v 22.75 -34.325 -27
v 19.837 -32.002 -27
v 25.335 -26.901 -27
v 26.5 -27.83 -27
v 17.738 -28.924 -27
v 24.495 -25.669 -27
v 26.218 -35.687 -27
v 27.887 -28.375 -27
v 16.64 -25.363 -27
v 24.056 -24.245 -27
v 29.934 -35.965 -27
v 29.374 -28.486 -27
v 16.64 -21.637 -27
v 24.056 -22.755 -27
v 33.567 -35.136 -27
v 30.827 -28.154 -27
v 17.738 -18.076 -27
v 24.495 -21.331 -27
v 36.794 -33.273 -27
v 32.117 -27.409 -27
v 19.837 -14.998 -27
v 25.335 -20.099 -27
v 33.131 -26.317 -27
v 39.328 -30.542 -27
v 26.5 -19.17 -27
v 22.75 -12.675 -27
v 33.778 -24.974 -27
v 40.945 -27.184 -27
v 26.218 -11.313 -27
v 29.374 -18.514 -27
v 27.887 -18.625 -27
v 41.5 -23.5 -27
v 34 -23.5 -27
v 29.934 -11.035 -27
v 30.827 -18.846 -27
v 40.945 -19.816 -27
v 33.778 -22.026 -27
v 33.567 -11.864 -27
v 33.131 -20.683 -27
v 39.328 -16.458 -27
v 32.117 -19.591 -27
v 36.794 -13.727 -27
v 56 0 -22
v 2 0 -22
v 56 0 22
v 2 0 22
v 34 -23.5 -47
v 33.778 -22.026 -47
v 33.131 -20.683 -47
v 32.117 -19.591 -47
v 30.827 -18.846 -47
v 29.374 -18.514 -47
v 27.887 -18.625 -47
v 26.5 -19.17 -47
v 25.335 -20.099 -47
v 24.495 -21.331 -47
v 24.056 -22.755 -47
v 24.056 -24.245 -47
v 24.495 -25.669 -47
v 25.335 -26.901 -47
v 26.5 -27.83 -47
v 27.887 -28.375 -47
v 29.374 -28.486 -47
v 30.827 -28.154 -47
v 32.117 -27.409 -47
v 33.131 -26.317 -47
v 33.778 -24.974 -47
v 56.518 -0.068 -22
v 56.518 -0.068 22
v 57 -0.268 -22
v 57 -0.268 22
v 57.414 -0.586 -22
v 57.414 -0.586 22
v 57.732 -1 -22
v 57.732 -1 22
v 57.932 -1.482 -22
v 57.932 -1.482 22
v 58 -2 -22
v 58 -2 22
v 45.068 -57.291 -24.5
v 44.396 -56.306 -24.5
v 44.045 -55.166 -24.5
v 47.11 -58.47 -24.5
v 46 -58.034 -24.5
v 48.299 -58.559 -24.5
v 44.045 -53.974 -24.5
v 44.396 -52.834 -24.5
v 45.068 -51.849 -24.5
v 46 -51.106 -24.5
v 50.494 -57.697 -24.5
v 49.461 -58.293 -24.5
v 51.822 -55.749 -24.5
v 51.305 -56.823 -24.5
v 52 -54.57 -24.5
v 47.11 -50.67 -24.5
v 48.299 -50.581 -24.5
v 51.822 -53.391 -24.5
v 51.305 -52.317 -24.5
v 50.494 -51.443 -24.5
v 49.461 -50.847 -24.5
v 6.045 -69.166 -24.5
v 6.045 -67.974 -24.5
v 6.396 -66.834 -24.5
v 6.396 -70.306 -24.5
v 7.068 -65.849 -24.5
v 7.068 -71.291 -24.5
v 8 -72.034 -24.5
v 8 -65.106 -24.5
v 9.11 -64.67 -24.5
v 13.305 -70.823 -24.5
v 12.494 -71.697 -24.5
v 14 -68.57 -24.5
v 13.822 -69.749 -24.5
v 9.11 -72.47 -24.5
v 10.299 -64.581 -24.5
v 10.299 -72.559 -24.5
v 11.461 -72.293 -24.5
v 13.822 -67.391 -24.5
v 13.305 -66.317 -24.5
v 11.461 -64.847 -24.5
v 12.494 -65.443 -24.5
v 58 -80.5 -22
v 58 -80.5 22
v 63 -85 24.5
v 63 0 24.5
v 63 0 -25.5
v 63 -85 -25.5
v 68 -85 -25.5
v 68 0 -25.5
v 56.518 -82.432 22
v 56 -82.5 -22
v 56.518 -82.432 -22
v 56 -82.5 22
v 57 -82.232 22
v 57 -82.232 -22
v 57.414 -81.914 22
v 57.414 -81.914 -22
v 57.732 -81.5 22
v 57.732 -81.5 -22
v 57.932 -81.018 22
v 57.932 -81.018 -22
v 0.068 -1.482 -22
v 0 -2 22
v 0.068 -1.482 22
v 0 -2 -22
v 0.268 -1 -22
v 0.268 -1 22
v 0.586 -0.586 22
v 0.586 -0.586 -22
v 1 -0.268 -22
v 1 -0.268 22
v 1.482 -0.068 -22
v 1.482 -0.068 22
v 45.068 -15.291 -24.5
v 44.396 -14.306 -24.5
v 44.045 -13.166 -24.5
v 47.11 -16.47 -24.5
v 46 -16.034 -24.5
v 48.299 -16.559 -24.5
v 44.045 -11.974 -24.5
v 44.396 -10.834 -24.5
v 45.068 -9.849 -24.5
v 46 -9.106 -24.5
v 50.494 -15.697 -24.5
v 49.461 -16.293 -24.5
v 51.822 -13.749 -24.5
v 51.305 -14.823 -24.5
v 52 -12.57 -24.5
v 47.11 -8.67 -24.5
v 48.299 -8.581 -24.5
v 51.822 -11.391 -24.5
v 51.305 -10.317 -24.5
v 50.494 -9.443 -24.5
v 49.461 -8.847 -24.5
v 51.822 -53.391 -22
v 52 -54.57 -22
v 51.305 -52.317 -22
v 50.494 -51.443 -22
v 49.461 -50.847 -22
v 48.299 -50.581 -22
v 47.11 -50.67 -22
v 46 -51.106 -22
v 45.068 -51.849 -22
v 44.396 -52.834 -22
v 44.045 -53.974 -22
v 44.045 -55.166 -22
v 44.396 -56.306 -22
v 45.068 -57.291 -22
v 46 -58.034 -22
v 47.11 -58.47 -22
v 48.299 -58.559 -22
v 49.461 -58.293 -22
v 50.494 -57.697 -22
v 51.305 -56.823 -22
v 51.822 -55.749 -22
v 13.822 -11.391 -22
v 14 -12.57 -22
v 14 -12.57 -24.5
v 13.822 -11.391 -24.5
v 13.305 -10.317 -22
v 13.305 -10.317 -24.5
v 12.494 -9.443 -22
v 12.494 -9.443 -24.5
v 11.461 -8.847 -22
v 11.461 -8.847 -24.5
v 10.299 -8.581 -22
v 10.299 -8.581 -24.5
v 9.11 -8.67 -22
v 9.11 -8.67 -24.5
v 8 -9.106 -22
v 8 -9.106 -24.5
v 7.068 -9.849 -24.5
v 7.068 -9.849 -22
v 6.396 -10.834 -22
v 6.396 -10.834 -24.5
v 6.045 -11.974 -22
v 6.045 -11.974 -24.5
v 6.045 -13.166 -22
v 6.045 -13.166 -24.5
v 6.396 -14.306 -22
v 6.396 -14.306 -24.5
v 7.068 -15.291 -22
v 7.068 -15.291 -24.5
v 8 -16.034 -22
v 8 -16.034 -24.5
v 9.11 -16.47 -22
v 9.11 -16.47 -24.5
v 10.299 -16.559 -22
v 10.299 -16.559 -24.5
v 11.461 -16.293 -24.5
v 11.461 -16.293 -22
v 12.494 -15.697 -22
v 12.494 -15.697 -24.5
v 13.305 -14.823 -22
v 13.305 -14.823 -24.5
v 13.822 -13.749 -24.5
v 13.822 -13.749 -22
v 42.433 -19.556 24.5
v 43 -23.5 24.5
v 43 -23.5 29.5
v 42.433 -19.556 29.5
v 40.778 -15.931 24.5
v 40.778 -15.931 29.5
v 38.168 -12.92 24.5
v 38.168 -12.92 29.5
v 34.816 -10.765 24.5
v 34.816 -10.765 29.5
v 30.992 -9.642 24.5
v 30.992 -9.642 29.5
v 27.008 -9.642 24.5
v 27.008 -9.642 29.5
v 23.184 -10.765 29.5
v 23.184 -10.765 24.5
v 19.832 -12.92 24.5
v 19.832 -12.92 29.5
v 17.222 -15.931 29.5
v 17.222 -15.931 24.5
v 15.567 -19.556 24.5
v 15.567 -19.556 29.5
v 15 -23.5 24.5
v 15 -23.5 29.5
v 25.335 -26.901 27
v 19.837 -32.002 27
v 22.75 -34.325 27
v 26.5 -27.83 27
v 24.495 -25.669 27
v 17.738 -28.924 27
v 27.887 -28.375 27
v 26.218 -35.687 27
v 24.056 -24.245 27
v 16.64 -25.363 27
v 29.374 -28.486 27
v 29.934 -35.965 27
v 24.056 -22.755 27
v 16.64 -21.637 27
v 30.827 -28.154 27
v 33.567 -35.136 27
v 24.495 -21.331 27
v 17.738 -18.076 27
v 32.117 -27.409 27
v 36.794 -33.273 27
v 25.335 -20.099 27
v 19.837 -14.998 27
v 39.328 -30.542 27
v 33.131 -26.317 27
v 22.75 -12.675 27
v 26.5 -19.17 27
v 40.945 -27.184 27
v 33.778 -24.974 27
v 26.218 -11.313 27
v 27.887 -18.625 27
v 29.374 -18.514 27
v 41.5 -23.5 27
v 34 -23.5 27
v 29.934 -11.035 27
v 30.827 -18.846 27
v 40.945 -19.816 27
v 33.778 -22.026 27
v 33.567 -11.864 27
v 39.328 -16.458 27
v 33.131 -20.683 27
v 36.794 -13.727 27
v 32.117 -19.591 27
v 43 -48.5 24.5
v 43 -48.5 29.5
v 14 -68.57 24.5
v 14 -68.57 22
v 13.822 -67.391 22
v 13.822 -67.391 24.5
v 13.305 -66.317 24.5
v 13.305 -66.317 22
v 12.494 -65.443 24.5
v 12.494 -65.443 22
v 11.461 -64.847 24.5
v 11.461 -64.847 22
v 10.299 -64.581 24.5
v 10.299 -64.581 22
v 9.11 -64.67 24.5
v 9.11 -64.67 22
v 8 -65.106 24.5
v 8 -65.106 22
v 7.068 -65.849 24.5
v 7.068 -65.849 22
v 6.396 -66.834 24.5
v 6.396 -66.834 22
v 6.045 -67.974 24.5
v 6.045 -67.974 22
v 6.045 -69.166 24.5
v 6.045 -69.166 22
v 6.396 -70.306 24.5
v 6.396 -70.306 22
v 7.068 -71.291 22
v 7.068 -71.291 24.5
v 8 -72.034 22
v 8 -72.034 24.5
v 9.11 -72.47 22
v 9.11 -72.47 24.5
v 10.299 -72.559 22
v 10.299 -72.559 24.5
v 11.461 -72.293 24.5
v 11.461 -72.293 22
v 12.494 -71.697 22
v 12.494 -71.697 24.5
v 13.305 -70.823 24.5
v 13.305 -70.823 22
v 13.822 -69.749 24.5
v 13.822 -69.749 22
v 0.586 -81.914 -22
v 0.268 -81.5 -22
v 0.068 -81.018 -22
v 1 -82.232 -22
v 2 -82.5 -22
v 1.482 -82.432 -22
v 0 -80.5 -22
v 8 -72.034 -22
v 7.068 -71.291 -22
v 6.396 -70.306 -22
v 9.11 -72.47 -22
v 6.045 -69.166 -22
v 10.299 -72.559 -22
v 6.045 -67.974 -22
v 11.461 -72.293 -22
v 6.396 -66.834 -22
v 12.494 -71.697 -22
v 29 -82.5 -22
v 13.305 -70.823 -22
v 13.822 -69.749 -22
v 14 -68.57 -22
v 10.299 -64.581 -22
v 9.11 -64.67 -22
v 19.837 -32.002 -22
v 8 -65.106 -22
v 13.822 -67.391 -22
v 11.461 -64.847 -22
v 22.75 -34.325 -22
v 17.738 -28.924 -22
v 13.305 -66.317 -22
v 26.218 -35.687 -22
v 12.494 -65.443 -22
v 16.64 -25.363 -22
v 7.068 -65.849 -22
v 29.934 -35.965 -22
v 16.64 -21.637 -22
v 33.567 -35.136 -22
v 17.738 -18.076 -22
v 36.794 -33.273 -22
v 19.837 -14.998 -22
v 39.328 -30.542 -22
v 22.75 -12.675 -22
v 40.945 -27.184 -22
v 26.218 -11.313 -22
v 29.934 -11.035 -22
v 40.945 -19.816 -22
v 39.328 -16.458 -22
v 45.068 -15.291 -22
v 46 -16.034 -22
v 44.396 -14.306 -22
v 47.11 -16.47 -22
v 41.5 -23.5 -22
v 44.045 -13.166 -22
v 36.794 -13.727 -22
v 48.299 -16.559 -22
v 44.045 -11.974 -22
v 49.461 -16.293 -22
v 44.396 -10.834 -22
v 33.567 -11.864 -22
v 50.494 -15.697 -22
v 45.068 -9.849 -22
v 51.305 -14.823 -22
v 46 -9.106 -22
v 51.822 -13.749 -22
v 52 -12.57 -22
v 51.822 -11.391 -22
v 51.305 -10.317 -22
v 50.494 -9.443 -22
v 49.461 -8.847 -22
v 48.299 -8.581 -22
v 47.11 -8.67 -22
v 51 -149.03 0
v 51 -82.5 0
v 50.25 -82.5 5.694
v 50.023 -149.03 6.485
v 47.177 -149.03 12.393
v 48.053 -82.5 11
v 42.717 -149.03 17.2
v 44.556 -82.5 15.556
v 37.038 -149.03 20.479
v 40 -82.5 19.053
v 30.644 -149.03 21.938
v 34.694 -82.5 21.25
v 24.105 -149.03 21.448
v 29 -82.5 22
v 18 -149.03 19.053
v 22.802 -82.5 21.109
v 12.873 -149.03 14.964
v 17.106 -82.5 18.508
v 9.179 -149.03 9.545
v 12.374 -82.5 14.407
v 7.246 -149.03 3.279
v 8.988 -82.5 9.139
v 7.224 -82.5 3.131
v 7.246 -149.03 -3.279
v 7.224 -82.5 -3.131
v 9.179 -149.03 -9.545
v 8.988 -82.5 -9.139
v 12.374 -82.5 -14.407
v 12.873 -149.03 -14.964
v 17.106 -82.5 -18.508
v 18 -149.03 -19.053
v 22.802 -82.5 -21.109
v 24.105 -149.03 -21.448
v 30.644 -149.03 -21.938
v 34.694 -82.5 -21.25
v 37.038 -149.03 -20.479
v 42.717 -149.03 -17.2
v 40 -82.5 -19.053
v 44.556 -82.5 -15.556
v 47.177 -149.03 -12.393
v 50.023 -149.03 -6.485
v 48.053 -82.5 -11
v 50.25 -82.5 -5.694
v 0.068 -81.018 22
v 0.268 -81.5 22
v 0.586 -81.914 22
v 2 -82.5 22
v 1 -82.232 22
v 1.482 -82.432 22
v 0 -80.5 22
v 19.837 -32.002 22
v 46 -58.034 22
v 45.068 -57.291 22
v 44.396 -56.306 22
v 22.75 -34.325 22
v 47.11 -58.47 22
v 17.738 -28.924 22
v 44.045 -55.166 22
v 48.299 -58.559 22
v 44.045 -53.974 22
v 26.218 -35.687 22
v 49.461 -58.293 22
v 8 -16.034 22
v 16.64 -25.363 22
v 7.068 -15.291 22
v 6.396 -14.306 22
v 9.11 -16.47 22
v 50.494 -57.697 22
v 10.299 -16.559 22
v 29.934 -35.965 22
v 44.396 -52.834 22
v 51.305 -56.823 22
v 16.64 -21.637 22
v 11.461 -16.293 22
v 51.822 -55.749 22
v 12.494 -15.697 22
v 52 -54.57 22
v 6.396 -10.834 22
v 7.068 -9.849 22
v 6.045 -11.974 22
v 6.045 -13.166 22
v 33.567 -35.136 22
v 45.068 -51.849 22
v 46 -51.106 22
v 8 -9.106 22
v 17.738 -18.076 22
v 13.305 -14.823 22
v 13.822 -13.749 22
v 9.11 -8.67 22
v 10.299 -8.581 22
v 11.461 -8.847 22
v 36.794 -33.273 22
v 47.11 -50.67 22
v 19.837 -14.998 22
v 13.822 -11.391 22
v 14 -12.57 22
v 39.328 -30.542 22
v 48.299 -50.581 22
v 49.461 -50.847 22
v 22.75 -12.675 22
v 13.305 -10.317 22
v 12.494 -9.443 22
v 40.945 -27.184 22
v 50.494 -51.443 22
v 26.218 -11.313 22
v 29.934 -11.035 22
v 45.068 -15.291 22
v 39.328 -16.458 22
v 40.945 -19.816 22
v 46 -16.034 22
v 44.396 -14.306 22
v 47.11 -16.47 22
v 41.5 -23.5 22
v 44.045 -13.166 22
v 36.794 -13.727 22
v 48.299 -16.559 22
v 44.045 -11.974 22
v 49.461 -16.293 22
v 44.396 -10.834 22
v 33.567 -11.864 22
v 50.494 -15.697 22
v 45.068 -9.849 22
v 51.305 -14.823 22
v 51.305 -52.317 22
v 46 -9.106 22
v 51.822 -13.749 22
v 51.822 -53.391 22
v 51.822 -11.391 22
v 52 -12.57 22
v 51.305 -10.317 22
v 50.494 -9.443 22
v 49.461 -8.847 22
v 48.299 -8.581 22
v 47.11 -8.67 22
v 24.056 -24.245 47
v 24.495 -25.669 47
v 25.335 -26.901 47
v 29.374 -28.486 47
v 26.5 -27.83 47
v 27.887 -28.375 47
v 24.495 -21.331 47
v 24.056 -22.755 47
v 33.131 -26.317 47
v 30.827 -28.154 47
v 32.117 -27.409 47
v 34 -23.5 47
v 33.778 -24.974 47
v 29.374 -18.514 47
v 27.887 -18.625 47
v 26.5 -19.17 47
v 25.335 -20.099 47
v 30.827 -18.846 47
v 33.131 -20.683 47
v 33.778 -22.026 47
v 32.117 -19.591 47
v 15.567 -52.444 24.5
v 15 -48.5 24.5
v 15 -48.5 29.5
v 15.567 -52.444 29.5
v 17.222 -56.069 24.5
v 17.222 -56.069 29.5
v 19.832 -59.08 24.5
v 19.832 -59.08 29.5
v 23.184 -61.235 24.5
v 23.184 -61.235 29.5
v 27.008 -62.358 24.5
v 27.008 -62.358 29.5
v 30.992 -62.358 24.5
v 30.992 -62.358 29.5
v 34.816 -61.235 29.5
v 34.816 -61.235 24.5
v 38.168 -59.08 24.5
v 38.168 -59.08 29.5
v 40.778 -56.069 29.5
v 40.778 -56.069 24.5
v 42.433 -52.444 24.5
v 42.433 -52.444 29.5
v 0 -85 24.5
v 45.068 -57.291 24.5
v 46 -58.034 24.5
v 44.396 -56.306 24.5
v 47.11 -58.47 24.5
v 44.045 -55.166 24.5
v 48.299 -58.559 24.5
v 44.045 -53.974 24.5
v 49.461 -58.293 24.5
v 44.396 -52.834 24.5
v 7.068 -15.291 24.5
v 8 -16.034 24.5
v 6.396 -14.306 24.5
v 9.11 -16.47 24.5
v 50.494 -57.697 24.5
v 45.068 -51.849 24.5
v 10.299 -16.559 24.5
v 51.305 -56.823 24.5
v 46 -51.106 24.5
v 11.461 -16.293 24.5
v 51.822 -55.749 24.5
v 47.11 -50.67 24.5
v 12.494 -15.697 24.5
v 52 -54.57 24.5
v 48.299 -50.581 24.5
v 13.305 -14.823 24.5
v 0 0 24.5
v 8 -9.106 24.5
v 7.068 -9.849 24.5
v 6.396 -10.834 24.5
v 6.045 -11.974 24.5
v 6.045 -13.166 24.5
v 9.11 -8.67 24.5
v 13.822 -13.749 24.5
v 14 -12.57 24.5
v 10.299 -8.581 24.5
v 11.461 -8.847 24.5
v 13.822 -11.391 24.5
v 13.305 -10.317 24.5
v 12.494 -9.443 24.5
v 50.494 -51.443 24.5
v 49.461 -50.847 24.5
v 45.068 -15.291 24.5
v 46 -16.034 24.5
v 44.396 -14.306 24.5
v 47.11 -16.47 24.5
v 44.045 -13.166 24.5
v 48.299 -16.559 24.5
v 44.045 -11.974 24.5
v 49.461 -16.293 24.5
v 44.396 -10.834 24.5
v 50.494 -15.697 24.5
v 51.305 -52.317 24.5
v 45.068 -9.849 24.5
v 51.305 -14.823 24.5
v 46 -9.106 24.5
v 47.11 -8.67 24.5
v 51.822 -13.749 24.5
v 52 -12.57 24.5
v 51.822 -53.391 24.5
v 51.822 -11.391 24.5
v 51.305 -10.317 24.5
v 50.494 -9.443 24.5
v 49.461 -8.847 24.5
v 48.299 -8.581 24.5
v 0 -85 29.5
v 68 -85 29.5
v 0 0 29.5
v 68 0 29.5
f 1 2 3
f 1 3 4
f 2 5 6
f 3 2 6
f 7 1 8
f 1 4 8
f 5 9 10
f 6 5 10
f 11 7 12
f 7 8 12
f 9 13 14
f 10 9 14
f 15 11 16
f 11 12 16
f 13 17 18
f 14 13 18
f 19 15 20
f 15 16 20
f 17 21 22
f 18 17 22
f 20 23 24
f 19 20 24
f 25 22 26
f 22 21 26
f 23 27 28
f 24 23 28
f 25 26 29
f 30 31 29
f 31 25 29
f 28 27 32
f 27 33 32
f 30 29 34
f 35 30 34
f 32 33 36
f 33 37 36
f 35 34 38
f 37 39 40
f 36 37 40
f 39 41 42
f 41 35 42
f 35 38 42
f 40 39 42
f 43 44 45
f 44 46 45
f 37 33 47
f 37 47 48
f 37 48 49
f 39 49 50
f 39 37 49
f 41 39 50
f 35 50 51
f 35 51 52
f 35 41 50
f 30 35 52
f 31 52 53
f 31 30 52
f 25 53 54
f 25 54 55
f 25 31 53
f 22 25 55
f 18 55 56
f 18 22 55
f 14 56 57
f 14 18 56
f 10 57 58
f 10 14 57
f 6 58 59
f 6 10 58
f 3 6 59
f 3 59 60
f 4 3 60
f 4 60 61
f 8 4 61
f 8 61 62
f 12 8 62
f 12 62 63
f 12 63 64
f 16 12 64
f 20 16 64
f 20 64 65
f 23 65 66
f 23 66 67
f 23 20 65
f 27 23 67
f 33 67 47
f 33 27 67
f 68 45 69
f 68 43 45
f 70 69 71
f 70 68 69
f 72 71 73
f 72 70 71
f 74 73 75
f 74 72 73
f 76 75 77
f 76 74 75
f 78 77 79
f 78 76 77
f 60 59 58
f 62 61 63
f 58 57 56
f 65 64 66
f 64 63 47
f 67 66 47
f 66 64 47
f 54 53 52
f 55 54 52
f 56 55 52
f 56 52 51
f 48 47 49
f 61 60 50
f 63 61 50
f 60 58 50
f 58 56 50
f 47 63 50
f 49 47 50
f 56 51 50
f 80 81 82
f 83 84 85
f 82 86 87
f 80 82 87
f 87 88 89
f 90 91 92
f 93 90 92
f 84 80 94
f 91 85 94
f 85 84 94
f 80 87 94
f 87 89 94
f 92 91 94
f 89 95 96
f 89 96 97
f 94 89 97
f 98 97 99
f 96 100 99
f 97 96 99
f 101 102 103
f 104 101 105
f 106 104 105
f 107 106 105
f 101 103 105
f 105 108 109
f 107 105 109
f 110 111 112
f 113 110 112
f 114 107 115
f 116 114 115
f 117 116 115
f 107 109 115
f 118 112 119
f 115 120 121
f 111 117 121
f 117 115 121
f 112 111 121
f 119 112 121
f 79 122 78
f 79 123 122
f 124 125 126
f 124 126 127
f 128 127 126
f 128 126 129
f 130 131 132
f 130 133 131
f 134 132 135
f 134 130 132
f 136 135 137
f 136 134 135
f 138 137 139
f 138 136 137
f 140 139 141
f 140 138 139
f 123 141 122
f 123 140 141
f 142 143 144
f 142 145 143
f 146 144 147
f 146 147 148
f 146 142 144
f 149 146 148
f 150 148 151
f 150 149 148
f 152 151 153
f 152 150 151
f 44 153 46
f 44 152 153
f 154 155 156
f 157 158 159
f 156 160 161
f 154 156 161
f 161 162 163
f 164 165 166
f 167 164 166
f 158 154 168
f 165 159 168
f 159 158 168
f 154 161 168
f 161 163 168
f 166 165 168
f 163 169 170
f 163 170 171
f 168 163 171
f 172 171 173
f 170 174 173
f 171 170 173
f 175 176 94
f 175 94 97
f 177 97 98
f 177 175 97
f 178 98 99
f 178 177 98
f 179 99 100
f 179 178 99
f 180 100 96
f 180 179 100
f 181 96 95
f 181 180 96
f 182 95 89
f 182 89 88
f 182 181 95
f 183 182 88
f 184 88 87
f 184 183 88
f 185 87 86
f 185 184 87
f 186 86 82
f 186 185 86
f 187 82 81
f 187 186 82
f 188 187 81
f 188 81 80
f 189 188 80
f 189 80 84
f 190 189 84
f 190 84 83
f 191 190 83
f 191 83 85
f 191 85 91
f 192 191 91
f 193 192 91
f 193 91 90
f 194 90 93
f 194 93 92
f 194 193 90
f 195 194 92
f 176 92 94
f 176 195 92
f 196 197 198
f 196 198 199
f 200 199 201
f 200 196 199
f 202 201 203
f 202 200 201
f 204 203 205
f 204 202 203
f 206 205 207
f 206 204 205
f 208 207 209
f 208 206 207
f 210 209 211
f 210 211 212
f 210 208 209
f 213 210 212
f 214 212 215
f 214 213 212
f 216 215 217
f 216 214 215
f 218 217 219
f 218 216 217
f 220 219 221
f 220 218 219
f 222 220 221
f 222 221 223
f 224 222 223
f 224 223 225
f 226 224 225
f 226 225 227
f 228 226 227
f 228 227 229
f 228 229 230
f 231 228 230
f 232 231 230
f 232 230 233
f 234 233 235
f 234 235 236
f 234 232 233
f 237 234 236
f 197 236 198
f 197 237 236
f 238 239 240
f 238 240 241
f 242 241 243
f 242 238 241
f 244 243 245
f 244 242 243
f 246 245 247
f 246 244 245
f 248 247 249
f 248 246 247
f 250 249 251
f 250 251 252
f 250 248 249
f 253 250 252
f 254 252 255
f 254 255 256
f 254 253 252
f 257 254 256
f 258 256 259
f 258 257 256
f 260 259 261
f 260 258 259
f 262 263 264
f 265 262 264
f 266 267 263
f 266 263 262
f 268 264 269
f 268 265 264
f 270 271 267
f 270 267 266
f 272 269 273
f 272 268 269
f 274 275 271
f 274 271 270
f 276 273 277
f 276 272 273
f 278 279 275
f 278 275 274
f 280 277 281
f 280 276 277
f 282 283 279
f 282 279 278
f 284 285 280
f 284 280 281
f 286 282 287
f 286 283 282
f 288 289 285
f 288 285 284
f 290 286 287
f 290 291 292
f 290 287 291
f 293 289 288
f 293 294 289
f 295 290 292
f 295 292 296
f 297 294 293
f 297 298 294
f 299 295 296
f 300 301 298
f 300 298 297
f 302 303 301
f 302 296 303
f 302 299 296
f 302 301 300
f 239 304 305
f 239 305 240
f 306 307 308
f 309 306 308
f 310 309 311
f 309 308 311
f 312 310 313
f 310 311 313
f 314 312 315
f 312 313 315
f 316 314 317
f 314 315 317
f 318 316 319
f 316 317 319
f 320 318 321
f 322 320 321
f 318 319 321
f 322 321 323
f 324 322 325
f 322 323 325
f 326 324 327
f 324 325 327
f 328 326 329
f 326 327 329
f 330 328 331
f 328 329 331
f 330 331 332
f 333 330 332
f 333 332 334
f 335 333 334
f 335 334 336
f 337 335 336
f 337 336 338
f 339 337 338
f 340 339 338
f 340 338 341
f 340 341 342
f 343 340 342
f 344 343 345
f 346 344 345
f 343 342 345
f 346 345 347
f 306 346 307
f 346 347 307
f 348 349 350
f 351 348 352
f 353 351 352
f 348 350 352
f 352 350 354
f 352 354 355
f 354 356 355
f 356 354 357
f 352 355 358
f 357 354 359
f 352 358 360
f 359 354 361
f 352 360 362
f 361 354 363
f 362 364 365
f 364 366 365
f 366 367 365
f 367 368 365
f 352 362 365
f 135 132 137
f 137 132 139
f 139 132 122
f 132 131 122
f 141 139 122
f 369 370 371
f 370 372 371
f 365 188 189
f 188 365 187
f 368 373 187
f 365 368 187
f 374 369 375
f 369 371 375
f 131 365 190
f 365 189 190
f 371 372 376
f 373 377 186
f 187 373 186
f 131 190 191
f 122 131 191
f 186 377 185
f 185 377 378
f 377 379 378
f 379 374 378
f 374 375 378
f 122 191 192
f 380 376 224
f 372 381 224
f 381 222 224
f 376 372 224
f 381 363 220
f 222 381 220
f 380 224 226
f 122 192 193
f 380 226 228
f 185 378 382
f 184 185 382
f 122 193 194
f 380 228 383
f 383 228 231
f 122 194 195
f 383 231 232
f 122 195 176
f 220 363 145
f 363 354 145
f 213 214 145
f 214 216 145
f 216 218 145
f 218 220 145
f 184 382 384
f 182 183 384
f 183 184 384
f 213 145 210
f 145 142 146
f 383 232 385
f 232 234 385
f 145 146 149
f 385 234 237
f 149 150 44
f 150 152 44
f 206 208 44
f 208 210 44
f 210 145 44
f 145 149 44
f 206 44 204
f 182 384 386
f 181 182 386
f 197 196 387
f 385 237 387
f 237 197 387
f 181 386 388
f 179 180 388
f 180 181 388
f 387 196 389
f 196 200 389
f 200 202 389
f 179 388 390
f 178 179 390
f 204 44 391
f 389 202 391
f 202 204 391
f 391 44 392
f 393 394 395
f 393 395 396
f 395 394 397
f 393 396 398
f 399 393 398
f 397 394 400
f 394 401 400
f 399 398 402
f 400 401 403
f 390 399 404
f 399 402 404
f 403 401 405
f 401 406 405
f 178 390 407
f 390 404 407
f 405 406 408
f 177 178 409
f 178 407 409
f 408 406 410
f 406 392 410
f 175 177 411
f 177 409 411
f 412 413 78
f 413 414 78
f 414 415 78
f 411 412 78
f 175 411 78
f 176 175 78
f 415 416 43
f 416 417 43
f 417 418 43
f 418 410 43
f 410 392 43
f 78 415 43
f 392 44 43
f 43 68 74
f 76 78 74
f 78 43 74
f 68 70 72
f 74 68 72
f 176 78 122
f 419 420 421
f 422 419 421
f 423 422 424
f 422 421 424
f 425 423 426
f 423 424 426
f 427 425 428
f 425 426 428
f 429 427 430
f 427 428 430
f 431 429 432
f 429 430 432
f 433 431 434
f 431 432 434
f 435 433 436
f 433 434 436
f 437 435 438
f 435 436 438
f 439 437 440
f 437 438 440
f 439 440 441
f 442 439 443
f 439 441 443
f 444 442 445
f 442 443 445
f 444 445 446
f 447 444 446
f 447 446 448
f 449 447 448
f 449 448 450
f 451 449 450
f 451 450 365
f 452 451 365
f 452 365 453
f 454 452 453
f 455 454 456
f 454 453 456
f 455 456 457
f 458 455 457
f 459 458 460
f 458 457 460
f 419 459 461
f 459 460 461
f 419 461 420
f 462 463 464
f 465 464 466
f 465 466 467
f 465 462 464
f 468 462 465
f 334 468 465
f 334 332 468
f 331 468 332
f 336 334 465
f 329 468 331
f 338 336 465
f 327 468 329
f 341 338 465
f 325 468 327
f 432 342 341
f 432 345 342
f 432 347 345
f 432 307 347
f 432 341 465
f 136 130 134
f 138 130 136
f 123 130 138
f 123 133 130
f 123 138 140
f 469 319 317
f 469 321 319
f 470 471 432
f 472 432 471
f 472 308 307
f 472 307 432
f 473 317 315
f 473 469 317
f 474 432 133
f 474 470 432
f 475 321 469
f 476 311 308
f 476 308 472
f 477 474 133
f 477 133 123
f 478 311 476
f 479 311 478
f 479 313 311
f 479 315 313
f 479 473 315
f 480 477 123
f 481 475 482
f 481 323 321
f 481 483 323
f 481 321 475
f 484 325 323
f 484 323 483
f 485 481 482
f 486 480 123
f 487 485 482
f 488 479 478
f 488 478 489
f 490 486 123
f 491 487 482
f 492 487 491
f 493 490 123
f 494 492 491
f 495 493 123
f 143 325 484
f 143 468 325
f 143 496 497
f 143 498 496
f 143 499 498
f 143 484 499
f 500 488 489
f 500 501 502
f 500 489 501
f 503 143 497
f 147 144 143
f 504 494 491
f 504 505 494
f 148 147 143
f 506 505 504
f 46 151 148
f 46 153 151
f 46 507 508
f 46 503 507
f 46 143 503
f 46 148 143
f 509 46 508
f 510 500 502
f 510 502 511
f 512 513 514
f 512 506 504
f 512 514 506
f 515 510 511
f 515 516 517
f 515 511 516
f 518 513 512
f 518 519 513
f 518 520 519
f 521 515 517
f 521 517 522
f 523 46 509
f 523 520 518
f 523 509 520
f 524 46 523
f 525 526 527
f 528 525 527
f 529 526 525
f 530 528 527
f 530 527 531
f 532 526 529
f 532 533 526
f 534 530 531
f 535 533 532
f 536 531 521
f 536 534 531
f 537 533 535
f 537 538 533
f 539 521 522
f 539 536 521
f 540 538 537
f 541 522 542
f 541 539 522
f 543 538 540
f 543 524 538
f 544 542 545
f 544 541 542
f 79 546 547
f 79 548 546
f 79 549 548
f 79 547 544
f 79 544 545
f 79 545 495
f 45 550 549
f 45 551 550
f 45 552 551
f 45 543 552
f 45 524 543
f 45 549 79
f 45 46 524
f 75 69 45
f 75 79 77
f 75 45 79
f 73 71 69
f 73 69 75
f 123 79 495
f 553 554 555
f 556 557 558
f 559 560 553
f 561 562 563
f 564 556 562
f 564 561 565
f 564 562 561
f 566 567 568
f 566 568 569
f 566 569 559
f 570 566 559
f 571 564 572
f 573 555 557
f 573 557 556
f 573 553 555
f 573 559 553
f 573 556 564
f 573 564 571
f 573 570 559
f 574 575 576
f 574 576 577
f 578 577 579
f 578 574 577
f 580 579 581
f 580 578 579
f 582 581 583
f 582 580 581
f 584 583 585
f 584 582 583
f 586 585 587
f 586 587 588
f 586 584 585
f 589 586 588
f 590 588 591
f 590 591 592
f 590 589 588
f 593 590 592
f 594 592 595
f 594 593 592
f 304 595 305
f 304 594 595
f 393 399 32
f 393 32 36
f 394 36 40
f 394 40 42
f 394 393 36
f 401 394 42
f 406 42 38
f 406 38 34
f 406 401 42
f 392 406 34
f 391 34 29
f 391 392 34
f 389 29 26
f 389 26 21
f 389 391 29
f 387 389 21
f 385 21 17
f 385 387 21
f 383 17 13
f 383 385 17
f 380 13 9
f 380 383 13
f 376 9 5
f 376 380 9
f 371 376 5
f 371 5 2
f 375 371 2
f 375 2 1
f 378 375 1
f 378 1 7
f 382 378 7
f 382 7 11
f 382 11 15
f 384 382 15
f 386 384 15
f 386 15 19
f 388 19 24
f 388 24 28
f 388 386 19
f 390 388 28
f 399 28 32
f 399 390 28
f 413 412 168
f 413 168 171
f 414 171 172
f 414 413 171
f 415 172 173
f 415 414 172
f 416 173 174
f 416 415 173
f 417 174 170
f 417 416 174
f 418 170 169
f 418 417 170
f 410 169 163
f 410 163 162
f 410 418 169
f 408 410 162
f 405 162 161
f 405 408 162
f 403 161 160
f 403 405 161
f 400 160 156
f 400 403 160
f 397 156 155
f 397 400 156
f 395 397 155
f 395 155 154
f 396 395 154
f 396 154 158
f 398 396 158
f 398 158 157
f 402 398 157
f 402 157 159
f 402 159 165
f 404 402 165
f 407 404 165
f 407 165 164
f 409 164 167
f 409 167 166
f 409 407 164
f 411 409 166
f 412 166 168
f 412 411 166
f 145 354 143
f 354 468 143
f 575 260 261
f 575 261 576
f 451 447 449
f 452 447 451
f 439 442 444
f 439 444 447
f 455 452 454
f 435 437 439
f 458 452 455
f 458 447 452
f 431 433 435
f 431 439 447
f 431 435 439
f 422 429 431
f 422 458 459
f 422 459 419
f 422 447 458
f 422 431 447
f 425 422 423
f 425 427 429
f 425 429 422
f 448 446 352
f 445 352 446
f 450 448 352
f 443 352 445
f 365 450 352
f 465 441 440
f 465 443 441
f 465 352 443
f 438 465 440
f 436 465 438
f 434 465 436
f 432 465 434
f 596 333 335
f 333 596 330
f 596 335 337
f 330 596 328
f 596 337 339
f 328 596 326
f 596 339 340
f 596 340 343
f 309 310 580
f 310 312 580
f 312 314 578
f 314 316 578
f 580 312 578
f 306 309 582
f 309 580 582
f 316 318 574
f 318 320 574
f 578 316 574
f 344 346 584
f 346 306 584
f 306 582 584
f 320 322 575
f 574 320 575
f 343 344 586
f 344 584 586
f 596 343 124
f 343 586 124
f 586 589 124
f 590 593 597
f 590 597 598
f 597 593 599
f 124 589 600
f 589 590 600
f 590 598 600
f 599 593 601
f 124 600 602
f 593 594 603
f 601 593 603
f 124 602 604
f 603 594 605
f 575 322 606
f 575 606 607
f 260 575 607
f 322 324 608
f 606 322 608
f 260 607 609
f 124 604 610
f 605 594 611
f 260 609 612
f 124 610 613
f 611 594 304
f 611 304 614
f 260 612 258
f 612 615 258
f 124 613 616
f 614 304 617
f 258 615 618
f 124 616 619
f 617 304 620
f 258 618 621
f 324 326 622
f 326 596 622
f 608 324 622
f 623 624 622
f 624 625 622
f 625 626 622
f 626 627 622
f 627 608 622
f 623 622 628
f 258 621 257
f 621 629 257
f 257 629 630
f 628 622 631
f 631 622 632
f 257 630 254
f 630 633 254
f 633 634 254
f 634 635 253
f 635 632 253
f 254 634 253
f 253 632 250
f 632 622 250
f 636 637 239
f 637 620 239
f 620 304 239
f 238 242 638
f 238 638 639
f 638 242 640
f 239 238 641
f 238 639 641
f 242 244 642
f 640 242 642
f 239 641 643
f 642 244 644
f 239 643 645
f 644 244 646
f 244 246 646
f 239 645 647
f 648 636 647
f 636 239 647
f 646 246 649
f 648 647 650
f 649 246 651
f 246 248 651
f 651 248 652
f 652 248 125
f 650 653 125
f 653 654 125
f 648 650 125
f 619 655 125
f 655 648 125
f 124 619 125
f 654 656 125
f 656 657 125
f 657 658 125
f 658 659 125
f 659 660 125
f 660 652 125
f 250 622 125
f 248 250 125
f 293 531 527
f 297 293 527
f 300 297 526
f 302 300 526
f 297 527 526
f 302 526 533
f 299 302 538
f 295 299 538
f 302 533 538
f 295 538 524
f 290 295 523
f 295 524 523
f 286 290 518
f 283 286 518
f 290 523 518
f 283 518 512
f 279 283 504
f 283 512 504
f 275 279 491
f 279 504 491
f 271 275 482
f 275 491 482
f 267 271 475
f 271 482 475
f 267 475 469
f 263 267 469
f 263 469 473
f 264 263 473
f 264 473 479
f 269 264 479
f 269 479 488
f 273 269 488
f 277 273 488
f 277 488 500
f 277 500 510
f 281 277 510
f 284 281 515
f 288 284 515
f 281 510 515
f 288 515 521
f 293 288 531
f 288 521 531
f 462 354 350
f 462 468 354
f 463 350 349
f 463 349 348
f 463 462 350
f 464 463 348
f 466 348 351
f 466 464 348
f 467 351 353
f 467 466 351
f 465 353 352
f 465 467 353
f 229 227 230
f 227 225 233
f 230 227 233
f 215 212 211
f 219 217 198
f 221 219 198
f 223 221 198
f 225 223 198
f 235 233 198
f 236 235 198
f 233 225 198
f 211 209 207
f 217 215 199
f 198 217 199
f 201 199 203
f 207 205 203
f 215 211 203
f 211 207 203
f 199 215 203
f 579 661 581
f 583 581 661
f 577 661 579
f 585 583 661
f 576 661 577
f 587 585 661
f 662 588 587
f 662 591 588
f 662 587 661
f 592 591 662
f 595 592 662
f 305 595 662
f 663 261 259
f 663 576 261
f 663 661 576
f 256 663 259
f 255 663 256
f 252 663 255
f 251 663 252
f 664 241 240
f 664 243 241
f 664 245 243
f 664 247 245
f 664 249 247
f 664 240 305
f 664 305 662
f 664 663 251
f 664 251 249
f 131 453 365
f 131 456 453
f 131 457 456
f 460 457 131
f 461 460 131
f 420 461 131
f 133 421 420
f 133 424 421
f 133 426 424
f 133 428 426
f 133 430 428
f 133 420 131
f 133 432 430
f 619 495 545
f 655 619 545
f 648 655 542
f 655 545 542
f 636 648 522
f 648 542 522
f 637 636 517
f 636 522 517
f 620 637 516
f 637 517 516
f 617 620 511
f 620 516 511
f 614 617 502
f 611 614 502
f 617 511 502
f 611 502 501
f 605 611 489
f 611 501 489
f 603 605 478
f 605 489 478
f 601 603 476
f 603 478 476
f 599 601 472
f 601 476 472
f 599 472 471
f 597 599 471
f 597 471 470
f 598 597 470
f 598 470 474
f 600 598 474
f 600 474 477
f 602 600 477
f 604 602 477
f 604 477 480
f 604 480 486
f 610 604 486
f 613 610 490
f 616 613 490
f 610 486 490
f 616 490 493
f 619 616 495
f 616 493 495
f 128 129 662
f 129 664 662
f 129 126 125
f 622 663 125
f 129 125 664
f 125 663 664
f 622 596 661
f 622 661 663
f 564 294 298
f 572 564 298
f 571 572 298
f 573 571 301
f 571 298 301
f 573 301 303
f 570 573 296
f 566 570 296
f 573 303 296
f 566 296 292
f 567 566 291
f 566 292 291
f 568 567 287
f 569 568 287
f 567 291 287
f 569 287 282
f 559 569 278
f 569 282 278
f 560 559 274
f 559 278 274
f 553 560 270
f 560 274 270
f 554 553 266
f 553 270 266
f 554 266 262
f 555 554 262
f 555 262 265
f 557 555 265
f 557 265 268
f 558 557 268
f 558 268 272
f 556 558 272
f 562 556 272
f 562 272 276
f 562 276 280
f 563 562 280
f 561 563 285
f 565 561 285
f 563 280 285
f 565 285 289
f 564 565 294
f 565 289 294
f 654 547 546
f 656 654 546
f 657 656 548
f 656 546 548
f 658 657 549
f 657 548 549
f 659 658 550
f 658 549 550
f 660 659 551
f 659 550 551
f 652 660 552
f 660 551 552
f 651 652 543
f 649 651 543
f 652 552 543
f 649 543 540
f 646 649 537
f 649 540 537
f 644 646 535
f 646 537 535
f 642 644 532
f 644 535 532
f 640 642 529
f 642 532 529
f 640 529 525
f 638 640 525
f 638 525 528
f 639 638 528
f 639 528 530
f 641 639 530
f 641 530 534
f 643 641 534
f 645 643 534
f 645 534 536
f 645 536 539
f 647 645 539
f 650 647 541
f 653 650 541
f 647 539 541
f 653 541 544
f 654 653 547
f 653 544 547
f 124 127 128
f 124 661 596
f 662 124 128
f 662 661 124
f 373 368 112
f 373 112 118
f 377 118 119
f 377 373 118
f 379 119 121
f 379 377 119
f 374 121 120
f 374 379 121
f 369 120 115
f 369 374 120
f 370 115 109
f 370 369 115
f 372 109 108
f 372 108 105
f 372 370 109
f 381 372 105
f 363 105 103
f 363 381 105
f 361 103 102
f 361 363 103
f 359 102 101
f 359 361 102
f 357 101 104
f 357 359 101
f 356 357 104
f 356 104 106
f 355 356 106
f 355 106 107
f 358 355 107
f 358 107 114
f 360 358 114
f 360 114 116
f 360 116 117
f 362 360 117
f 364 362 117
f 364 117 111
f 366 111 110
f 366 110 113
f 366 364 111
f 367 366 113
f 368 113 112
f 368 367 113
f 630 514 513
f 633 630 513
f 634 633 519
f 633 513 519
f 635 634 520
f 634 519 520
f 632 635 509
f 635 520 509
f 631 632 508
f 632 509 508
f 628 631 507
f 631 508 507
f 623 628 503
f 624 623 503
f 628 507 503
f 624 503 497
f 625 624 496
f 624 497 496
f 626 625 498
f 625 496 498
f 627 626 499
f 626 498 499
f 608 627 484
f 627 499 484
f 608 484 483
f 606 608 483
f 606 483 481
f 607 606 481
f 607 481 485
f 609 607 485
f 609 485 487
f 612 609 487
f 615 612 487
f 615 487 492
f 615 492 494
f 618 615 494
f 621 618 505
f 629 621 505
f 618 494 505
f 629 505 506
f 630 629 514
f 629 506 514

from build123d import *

# Parameters (mm, degrees)
SKETCH_W       = 58
SKETCH_H       = 82.5
PAD_DEPTH      = 22
PAD_DEPTH_BACK = 22
SKETCH001_R    = 12.5
PAD001_DEPTH   = 5
SKETCH002_R    = 5
PAD002_DEPTH   = 20
SKETCH003_R    = 4
PAD003_DEPTH   = 2.5
FILLET_R       = 2
SKETCH004_R    = 22
PAD004_DEPTH   = 66.53
SKETCH005_W    = 68
SKETCH005_H    = 85
PAD005_DEPTH   = 5
SKETCH006_W    = 5
SKETCH006_H    = 85
PAD006_DEPTH   = 50


with BuildPart() as part:
    # Sketch → Pad (new body, two sides)
    with BuildSketch(Plane.XY) as pad_sk:
        with Locations((29, -41.25)):
            Rectangle(SKETCH_W, SKETCH_H)
    extrude(amount=PAD_DEPTH)
    extrude(pad_sk.sketch, amount=-PAD_DEPTH_BACK)

    # Sketch001 (on Face6 of Pad) → Pad001 (join)
    with BuildSketch(Plane.XY.offset(22)):
        with Locations((29, -23.5)):
            Circle(SKETCH001_R)
    pad001 = extrude(amount=PAD001_DEPTH)

    # Mirrored: Pad001 across XY
    add(pad001.mirror(Plane.XY))

    # Sketch002 (on Face10 of Mirrored) → Pad002 (join)
    with BuildSketch(Plane.XY.offset(27)):
        with Locations((29, -23.5)):
            Circle(SKETCH002_R)
    pad002 = extrude(amount=PAD002_DEPTH)

    # Mirrored001: Pad002 across XY
    add(pad002.mirror(Plane.XY))

    # Sketch003 (on Face5 of Mirrored001) → Pad003 (join)
    with BuildSketch(Plane.XY.offset(22)):
        with Locations((10, -12.57)):
            Circle(SKETCH003_R)
        with Locations((48, -12.57)):
            Circle(SKETCH003_R)
        with Locations((10, -68.57)):
            Circle(SKETCH003_R)
        with Locations((48, -54.57)):
            Circle(SKETCH003_R)
    pad003 = extrude(amount=PAD003_DEPTH)

    # Mirrored002: Pad003 across XY
    add(pad003.mirror(Plane.XY))

    # Fillet
    fillet_edges = [part.edges().sort_by_distance(p)[0] for p in [
        (58, 0, 0),
        (0, 0, 0),
        (58, -82.5, 0),
        (0, -82.5, 0),
    ]]
    fillet(fillet_edges, radius=FILLET_R)

    # Sketch004 (on Face10 of Fillet) → Pad004 (join)
    with BuildSketch(Plane.XZ.offset(82.5)):
        with Locations((29, 0)):
            Circle(SKETCH004_R)
    extrude(amount=PAD004_DEPTH)

    # Sketch005 (on Face32 of Pad004) → Pad005 (join)
    with BuildSketch(Plane.XY.offset(24.5)):
        with Locations((34, -42.5)):
            Rectangle(SKETCH005_W, SKETCH005_H)
        with BuildLine():
            ThreePointArc((43, -23.5), (29, -9.5), (15, -23.5))
            Line((15, -23.5), (15, -48.5))
            ThreePointArc((15, -48.5), (29, -62.5), (43, -48.5))
            Line((43, -48.5), (43, -23.5))
        make_face(mode=Mode.SUBTRACT)
    extrude(amount=PAD005_DEPTH)

    # Sketch006 (on Face4 of Pad005) → Pad006 (join)
    with BuildSketch(Plane(origin=(0, 0, 24.5), x_dir=(1, 0, 0), z_dir=(0, 0, -1))):
        with Locations((65.5, 42.5)):
            Rectangle(SKETCH006_W, SKETCH006_H)
    extrude(amount=PAD006_DEPTH)


solid = part.part
